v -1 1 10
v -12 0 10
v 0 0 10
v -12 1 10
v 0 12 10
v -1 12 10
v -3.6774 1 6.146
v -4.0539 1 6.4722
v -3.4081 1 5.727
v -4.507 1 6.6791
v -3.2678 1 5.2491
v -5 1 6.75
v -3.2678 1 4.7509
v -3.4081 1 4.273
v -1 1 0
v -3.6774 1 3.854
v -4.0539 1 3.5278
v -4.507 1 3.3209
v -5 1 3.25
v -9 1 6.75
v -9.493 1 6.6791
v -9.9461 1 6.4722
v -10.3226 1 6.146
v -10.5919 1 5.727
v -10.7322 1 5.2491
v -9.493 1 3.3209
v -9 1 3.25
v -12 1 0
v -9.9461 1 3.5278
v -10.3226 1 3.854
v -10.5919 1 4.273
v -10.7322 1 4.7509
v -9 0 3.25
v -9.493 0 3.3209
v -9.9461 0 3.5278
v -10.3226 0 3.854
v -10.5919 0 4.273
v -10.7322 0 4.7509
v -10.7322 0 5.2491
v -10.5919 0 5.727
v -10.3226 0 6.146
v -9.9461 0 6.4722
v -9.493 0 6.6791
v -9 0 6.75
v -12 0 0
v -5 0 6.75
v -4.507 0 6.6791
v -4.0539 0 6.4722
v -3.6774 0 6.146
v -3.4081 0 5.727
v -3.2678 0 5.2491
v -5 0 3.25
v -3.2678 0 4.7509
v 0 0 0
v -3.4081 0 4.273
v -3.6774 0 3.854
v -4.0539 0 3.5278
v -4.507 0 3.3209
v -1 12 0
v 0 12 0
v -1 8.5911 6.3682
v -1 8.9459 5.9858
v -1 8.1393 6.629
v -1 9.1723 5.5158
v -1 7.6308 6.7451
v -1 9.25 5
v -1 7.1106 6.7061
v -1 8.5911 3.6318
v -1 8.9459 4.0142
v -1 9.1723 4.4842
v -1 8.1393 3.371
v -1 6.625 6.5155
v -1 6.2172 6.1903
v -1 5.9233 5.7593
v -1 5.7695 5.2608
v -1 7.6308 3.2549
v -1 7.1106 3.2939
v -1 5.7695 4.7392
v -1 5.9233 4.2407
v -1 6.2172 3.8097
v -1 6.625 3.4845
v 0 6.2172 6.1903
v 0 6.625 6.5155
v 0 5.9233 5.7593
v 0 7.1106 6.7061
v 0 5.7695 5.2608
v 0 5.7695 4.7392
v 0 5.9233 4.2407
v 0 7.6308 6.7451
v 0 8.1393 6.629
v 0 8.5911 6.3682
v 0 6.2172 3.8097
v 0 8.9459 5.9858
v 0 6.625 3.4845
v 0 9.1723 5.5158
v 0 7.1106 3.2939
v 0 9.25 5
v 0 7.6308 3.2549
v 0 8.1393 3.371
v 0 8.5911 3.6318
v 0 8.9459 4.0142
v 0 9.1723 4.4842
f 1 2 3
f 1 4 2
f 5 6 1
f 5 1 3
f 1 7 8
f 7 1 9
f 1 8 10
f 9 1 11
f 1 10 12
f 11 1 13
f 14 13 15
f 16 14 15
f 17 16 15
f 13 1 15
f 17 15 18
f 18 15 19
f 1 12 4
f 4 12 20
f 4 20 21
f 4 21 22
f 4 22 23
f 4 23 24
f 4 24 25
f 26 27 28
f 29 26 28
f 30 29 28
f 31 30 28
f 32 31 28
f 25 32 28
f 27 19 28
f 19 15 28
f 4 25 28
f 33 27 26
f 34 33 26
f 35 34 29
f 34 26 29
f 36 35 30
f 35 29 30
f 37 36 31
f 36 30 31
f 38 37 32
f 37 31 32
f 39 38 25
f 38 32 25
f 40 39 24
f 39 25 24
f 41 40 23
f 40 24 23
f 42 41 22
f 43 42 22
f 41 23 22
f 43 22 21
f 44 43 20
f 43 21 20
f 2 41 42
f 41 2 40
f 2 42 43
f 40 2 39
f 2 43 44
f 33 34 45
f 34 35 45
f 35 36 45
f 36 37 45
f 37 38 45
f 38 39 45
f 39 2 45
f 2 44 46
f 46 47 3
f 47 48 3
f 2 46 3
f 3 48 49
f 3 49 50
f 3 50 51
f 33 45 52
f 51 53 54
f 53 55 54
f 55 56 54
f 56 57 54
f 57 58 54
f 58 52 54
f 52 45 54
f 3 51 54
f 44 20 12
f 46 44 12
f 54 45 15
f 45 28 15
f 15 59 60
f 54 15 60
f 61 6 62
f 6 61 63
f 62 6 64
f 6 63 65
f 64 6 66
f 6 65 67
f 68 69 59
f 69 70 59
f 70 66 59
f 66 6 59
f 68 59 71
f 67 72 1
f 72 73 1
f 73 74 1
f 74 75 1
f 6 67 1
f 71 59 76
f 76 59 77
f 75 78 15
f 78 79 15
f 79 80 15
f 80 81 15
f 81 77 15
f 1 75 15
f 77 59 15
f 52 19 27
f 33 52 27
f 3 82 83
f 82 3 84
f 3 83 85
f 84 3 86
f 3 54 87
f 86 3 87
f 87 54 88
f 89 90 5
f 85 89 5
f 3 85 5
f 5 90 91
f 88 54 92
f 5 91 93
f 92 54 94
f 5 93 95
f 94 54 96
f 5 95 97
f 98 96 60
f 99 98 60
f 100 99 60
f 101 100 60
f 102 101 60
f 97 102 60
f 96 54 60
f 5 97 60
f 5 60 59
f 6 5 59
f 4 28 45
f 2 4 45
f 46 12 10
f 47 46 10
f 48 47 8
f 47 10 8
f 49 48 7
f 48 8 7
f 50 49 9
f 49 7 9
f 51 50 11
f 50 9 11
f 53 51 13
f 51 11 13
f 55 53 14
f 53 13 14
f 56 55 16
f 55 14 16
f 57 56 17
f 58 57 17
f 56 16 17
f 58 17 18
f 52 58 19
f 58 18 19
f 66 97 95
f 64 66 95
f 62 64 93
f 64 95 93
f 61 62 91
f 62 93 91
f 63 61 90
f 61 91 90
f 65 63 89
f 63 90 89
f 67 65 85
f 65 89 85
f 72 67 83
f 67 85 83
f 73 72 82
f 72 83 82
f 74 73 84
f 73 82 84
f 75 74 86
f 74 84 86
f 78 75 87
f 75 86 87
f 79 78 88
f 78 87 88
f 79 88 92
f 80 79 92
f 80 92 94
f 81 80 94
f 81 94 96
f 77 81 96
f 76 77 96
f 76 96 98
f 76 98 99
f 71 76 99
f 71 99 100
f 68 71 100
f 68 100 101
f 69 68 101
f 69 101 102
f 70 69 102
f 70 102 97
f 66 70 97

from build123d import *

# Parameters (mm, degrees)
F1_DEPTH = 10
F4_D     = 3.5
F5_DEPTH = 25


with BuildPart() as f1:
    # F0 (on Top) → F1 (new body)
    with BuildSketch(Plane.XY):
        Polygon((-12, 0), (0, 0), (0, 12), (-1, 12), (-1, 1), (-12, 1), align=None)
    extrude(amount=F1_DEPTH)

    # F4 (through all)
    with Locations(Plane(origin=(-1, 0, 0), x_dir=(0, -1, 0), z_dir=(-1, 0, 0))):
        with Locations((-7.5, 5)):
            Hole(F4_D / 2)

    # F2 (on face) → F5 (cut)
    with BuildSketch(Plane(origin=(0, 1, 0), x_dir=(-1, 0, 0), z_dir=(0, 1, 0))):
        with BuildLine():
            Line((9, 6.75), (5, 6.75))
            ThreePointArc((5, 6.75), (3.25, 5), (5, 3.25))
            Line((5, 3.25), (9, 3.25))
            ThreePointArc((9, 3.25), (10.75, 5), (9, 6.75))
        make_face()
    extrude(amount=-F5_DEPTH, mode=Mode.SUBTRACT)


solid = f1.part
